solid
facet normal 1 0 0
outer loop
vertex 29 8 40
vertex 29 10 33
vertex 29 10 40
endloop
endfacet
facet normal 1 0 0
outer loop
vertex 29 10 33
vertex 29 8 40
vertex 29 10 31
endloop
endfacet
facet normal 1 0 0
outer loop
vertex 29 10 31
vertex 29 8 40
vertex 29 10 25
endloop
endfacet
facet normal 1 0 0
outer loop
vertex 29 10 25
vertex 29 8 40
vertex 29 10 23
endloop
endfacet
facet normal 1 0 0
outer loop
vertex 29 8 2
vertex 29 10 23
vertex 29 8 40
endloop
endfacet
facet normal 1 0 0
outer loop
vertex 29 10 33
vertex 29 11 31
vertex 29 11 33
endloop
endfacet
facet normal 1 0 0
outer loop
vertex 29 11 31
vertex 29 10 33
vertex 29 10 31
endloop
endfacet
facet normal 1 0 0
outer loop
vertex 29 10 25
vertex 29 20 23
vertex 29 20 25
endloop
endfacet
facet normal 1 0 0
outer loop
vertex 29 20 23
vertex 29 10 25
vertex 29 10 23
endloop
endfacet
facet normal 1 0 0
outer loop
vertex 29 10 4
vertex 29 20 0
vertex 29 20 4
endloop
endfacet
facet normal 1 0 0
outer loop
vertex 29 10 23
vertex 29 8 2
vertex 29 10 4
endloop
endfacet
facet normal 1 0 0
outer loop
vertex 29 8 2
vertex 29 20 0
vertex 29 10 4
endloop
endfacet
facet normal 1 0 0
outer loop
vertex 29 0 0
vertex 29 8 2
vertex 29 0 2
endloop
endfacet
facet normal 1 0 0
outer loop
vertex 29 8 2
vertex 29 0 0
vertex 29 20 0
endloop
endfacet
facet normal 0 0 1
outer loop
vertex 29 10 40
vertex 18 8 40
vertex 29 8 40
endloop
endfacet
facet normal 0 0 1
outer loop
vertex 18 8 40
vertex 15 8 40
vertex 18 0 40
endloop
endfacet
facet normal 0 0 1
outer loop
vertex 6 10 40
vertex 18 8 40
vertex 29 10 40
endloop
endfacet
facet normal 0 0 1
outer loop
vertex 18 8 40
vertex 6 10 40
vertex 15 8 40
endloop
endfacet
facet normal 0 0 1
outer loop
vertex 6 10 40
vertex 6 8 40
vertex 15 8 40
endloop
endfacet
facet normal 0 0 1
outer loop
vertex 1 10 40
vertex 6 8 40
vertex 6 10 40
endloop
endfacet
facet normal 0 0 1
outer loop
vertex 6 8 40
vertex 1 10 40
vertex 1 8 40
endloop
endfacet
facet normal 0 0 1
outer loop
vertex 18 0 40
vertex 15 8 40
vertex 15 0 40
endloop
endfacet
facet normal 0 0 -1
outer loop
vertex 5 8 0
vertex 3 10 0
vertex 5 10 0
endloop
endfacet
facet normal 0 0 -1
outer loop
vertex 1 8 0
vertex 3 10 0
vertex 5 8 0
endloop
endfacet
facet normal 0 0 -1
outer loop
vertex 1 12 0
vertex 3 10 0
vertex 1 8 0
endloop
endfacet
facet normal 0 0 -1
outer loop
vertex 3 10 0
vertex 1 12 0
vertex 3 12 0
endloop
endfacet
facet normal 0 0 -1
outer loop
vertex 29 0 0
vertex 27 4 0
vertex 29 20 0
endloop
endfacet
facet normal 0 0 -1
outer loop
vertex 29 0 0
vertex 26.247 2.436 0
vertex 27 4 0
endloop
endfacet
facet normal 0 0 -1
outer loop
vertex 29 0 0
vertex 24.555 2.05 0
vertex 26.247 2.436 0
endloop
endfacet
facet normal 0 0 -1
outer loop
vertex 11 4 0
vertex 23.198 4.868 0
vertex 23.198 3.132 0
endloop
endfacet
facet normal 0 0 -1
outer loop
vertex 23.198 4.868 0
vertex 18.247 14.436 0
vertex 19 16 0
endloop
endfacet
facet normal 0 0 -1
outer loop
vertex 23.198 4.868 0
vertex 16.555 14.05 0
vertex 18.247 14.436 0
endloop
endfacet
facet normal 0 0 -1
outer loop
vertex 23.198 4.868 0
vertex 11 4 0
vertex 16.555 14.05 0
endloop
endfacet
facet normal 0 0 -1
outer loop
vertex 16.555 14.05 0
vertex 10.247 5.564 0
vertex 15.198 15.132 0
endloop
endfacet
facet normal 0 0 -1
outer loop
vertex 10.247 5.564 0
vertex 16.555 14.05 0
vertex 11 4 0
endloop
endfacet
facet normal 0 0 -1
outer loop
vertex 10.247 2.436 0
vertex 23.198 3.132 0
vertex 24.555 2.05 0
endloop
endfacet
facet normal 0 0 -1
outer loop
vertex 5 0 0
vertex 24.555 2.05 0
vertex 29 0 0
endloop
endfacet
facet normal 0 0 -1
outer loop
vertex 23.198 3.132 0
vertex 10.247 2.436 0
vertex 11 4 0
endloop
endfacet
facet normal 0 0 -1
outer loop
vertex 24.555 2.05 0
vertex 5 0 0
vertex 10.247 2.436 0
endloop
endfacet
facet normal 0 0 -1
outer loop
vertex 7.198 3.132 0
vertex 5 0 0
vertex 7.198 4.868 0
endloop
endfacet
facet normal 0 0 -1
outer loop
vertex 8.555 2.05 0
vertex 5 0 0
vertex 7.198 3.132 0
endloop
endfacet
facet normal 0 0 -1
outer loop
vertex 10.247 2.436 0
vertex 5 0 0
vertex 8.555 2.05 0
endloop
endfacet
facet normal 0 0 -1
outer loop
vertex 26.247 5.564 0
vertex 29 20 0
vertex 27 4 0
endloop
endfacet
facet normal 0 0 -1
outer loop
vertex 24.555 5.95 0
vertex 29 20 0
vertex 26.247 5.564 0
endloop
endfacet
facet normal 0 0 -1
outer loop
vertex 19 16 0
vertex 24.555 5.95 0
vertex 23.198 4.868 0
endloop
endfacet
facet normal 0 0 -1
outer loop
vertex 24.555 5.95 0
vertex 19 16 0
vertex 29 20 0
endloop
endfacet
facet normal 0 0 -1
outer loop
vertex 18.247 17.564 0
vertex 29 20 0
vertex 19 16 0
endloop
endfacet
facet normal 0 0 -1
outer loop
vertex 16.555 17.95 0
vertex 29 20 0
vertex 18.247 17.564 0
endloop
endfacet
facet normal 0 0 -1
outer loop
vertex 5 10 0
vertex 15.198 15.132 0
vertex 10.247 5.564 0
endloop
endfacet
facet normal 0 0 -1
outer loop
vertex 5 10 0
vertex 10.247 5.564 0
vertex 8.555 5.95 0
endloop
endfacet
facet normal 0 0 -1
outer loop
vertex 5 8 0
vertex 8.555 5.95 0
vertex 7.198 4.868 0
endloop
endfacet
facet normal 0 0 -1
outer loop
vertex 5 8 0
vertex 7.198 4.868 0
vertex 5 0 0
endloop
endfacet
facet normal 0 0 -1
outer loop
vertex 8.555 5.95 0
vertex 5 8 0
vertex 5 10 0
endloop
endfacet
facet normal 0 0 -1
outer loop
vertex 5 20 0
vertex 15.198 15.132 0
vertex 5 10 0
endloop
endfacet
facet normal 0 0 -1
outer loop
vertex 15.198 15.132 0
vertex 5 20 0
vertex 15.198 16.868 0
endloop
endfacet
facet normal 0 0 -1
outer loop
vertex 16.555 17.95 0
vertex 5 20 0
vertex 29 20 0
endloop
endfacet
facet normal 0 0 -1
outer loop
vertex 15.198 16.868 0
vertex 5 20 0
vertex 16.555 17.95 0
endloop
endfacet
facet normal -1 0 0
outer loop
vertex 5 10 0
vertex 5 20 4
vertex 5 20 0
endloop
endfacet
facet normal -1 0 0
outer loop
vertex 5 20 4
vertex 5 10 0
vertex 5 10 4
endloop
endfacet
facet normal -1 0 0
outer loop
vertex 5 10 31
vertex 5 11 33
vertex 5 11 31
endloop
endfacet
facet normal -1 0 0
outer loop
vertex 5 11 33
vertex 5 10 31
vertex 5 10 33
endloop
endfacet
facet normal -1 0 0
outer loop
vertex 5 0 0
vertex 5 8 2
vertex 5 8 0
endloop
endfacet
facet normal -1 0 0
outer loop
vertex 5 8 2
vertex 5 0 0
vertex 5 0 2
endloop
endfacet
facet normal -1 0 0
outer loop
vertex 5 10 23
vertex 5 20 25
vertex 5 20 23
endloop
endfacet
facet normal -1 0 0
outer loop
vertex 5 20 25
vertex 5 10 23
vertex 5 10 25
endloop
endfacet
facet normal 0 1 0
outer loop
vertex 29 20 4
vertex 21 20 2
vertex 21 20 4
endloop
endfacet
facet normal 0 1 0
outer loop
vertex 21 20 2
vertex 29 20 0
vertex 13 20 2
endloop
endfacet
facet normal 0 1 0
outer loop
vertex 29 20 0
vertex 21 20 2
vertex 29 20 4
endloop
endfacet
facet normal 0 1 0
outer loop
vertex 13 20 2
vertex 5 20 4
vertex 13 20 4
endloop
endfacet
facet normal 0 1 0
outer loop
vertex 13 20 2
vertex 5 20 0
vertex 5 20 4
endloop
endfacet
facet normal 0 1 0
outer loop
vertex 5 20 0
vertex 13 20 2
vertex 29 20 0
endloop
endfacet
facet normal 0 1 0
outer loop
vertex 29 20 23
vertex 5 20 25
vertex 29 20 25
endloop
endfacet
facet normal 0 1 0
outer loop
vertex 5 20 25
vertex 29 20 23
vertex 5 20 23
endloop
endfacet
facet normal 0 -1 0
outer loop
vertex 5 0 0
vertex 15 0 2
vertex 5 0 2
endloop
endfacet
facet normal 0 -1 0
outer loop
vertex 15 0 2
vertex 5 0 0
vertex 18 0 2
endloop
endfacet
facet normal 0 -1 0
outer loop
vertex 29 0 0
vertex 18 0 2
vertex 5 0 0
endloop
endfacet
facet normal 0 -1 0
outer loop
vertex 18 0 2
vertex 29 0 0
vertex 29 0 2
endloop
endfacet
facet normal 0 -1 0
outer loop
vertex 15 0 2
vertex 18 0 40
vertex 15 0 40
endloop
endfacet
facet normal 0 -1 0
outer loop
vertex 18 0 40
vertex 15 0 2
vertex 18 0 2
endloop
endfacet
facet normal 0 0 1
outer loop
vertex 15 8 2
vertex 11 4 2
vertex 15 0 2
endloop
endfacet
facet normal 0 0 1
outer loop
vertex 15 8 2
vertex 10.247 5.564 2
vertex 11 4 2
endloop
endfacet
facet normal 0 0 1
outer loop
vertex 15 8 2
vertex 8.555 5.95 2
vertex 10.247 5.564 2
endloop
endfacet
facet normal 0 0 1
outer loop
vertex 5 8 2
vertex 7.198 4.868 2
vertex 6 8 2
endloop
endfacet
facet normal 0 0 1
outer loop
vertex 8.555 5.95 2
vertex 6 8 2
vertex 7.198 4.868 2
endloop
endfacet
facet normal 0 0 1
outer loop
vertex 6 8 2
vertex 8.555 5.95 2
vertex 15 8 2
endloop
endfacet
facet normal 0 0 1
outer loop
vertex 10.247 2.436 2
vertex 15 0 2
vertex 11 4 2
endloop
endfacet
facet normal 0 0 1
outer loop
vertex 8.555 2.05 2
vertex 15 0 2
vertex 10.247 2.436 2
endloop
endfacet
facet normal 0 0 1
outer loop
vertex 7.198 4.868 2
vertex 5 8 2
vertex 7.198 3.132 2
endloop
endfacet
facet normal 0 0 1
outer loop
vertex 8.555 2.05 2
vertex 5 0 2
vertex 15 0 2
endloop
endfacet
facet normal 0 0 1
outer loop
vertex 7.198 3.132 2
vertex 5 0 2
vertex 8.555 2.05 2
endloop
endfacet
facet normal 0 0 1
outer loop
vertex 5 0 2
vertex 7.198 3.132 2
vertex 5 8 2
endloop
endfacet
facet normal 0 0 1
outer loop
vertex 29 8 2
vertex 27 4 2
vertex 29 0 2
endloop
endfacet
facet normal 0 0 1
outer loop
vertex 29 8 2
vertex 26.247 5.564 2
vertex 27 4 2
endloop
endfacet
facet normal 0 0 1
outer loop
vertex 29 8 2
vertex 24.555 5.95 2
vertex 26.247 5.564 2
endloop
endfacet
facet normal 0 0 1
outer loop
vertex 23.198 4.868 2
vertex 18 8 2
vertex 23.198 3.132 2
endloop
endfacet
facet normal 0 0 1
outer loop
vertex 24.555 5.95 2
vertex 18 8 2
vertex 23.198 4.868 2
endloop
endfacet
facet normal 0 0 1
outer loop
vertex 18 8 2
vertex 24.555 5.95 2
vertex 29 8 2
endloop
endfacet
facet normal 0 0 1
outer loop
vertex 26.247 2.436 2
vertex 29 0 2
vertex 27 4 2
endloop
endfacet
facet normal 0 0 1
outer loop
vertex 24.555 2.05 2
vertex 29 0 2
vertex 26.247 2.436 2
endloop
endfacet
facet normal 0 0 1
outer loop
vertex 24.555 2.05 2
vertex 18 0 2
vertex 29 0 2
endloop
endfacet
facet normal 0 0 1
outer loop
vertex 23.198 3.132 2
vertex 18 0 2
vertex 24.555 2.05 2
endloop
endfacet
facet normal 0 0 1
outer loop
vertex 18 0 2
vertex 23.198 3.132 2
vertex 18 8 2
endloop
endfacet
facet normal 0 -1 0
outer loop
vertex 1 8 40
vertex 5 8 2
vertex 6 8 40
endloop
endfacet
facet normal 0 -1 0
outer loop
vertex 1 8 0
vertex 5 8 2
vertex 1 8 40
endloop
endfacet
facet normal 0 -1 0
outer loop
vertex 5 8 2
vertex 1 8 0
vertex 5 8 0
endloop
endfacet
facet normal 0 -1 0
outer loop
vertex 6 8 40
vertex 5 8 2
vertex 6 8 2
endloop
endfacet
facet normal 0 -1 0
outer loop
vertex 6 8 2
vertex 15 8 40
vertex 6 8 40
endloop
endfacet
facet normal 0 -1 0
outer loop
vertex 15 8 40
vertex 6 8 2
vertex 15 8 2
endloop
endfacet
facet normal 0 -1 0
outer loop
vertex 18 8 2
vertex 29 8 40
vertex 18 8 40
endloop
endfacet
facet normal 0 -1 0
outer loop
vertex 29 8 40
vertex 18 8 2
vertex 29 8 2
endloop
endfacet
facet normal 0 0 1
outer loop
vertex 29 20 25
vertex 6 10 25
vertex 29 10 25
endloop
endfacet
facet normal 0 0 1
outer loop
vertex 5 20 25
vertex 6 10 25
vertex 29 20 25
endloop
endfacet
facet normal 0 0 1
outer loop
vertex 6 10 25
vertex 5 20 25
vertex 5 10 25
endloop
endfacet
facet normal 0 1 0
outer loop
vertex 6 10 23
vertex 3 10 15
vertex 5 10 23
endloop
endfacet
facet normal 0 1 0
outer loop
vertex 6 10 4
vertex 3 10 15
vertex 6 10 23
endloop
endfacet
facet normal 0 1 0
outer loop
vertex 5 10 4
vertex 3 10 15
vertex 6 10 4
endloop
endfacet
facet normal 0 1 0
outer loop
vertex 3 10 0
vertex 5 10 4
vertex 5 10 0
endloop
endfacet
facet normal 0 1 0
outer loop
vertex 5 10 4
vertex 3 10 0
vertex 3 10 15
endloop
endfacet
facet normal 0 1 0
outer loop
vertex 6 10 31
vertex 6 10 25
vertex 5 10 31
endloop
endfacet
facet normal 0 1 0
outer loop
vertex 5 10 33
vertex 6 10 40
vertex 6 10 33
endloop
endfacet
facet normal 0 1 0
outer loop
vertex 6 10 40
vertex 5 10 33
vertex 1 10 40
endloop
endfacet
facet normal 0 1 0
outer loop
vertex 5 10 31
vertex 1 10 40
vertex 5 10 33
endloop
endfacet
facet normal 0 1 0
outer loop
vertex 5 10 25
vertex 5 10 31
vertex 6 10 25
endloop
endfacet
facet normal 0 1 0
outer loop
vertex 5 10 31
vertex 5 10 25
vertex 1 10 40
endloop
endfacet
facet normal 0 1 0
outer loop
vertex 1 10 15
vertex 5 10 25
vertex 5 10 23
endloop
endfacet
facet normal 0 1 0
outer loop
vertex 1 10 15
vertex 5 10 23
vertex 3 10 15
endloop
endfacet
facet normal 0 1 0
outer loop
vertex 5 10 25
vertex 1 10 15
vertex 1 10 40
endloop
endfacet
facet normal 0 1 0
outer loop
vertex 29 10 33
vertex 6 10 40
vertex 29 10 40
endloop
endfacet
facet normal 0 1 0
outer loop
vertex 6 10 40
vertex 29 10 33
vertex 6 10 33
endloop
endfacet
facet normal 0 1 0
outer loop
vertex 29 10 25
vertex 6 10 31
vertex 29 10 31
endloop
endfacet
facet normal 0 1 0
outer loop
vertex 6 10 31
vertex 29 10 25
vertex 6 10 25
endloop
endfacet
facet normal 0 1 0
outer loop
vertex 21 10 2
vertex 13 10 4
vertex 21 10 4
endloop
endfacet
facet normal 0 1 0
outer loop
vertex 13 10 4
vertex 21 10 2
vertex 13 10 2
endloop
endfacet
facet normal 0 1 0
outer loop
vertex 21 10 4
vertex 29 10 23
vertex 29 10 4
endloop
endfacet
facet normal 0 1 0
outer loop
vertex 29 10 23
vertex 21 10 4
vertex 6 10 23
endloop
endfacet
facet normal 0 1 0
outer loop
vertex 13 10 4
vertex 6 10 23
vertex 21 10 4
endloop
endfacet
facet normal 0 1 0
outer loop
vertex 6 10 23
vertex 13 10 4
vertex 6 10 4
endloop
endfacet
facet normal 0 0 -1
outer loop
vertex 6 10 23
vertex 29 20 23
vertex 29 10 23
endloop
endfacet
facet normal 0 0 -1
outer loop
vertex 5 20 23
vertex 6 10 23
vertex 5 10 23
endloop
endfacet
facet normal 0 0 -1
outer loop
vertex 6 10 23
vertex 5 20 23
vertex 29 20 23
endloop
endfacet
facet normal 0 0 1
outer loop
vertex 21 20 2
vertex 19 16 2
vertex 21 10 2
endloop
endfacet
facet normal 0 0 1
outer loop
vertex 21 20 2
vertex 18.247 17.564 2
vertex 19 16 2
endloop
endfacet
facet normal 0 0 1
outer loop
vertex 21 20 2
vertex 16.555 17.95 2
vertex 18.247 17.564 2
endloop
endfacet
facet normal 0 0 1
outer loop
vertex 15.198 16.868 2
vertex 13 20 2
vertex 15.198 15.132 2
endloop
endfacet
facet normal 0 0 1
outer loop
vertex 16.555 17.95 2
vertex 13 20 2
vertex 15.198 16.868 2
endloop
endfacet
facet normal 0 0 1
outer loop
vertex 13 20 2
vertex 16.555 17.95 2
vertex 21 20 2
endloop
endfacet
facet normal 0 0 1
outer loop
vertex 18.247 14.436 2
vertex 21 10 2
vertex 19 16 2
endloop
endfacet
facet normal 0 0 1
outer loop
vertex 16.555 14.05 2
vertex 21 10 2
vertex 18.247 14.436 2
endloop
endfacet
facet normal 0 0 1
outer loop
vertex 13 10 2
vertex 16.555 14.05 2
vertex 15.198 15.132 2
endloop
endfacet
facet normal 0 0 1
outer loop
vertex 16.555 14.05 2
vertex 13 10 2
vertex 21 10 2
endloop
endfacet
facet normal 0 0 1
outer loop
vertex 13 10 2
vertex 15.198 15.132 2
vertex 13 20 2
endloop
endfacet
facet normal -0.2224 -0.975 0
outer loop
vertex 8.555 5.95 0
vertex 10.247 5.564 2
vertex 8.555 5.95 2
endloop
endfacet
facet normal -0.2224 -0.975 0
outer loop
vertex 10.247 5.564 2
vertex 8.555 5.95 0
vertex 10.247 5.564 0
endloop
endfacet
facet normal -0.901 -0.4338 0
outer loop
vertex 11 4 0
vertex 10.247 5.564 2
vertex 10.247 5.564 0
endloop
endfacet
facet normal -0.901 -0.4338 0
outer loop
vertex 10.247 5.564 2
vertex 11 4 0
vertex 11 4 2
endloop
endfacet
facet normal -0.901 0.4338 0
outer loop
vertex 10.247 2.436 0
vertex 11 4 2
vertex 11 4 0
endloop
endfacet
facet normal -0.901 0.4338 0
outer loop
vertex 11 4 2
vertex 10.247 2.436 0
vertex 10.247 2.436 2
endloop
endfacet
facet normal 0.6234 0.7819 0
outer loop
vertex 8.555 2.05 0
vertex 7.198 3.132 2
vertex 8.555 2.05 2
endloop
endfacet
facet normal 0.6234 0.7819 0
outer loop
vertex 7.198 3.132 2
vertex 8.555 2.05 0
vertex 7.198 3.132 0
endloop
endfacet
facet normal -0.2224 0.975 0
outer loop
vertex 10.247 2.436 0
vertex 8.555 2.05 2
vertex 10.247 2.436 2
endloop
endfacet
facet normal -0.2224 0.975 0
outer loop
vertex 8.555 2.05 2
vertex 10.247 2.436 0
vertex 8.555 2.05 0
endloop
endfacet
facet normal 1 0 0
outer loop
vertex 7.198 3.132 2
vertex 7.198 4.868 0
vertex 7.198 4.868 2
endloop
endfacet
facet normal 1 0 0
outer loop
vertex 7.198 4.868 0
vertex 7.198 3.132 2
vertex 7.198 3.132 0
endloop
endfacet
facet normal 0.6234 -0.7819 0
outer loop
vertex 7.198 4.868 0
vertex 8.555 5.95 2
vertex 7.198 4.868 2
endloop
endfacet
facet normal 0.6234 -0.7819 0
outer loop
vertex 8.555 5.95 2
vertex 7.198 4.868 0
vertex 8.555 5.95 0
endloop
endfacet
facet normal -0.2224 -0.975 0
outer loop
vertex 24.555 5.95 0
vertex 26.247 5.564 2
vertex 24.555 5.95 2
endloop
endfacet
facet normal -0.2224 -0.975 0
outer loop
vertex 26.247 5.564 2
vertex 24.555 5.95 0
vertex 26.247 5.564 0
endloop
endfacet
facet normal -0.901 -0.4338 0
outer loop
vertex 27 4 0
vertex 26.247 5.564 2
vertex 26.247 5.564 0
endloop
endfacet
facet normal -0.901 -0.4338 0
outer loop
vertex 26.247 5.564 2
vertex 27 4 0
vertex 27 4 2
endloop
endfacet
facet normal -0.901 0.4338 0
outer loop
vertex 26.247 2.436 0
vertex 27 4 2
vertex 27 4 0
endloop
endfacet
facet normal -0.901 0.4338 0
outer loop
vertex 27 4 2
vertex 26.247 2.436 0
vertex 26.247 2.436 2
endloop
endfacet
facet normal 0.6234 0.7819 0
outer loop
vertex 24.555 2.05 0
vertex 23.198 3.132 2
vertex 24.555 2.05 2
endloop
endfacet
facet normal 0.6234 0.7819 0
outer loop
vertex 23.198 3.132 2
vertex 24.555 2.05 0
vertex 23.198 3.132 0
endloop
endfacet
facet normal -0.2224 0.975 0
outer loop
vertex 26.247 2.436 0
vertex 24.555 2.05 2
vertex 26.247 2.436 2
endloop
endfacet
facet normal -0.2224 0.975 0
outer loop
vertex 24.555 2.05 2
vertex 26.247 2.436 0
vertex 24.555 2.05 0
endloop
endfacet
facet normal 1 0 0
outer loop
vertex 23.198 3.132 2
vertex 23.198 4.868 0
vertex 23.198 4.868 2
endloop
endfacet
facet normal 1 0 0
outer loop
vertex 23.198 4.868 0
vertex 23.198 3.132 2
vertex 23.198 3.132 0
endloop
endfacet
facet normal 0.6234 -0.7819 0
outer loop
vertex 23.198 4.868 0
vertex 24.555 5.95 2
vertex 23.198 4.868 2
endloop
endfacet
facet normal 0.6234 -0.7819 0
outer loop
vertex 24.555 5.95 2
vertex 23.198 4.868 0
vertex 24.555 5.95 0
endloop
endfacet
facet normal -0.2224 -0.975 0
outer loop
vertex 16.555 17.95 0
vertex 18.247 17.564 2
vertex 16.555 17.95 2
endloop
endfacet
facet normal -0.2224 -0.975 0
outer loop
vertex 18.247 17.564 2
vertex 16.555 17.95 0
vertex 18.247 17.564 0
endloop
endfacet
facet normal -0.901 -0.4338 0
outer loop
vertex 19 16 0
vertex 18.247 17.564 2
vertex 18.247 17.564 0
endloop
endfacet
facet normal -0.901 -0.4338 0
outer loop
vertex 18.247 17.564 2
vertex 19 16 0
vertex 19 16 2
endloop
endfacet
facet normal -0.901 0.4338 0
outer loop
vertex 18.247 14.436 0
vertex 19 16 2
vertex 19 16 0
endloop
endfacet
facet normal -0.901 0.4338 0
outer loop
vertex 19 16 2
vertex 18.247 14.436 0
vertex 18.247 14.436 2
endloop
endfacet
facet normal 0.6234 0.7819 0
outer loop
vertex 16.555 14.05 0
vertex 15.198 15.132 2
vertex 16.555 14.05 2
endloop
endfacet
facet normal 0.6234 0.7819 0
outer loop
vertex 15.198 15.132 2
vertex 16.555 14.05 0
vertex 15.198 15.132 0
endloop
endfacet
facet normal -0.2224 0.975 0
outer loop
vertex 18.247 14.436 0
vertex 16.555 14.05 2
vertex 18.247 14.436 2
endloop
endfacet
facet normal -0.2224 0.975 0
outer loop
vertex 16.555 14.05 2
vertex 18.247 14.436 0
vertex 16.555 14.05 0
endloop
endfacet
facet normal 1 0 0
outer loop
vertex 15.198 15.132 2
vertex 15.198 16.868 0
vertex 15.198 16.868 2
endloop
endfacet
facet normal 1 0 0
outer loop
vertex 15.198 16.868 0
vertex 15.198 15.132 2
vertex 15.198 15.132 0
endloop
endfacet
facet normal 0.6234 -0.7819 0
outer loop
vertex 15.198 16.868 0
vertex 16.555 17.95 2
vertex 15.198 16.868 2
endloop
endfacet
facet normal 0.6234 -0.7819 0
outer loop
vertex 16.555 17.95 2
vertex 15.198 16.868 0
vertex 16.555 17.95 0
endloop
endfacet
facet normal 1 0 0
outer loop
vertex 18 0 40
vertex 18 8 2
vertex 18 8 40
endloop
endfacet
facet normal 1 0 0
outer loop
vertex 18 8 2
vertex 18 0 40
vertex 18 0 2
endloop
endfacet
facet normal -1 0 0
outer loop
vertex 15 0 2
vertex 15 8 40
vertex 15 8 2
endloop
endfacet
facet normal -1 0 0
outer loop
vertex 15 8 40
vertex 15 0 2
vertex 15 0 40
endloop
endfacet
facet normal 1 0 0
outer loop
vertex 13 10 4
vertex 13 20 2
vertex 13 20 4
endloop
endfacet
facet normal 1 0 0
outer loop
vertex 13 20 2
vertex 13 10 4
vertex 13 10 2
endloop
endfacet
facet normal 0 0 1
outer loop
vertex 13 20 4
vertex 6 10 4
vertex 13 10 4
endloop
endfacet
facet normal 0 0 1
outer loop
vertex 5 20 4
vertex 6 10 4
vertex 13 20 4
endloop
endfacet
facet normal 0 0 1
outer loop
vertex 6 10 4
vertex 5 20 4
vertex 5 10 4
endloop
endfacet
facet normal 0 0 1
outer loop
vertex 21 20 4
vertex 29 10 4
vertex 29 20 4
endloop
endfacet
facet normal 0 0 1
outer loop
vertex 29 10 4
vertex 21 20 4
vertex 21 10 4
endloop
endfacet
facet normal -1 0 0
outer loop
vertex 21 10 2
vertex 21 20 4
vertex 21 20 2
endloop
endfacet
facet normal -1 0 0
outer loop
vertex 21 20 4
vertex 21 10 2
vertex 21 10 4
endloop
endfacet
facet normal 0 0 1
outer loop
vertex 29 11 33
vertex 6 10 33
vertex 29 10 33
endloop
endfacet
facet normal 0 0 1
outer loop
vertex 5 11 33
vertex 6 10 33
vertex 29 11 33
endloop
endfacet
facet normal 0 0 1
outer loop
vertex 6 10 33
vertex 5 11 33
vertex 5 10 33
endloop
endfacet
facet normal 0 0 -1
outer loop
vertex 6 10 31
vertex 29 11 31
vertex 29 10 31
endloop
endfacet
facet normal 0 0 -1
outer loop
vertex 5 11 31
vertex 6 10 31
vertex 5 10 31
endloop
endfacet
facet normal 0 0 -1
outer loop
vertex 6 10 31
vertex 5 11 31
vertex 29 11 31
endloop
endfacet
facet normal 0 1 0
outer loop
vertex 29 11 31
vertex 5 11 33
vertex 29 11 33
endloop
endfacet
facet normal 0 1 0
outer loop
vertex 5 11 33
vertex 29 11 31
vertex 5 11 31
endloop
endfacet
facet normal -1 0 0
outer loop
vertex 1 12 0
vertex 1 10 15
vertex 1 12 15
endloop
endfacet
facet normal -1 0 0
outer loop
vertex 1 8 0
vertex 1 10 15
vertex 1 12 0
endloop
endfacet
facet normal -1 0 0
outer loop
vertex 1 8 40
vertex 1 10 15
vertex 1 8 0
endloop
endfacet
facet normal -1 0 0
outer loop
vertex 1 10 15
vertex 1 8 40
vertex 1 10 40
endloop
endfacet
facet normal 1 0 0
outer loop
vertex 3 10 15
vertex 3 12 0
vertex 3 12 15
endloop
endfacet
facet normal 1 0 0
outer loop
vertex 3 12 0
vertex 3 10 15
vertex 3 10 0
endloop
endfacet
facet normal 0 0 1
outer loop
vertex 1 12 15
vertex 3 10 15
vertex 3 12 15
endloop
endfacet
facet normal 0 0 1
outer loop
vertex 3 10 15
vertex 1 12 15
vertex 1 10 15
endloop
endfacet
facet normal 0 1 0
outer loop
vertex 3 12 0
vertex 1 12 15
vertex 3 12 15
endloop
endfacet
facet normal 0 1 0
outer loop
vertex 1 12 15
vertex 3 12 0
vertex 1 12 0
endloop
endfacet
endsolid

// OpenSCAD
largeur = 3;
hauteur = 5;
epaisseur = 2;

translate([5,0,0])
union(){
difference(){
difference(){
    cube([largeur*8, 20, hauteur*8]);
    translate([-1,-1,epaisseur]){
        cube([largeur*8+2, 9, hauteur*8]);
    };
    translate([-1,8+epaisseur,24+epaisseur/2]){
        cube([largeur*8+2, 8+epaisseur+1, 24+epaisseur/2]);
    };
    translate([-1,8+epaisseur,epaisseur]){
        cube([largeur*8+2, 8+epaisseur+1, 24-epaisseur/2-epaisseur]);
    };
};


/*union(){
for(i=[0:largeur]){
    for(j=[0:1]){
      
        translate([4+i*8, 12, 8+j*8]){
            rotate([90,0,0]){
            cylinder(h=4, r= 2);
            }
        }
    };
    for(j=[3:hauteur-2]){
      
        translate([4+i*8, 12, 8+j*8]){
            rotate([90,0,0]){
            cylinder(h=4, r= 2);
            }
        }
    }
    
    
    }
};*/
union(){
    for(i=[0:largeur]){
        translate([4+i*8, 4, -1]){
            if(i==0 || i == largeur-1)
            cylinder(h=4, r=2);
            }
    }
};

union(){
    for(i=[0:largeur]){
        translate([4+i*8, 16, -1]){
            if(i!=0 && i != largeur-1)
            cylinder(h=epaisseur+2, r=2);
            }
    }
};

};

translate([10,0,0]){cube([3, 9,hauteur*8 ]);};

translate([0, 9, 0]){cube([8,11, epaisseur+2]);};
translate([8*(largeur-1), 9, 0]){cube([8,11, epaisseur+2]);};

translate([0,9,31]){cube([largeur*8, 2, 2]);};
};

translate([1,8,0]){cube([5, epaisseur, hauteur*8]);}

translate([1,9,0]){cube([2,3,3*hauteur]);};
